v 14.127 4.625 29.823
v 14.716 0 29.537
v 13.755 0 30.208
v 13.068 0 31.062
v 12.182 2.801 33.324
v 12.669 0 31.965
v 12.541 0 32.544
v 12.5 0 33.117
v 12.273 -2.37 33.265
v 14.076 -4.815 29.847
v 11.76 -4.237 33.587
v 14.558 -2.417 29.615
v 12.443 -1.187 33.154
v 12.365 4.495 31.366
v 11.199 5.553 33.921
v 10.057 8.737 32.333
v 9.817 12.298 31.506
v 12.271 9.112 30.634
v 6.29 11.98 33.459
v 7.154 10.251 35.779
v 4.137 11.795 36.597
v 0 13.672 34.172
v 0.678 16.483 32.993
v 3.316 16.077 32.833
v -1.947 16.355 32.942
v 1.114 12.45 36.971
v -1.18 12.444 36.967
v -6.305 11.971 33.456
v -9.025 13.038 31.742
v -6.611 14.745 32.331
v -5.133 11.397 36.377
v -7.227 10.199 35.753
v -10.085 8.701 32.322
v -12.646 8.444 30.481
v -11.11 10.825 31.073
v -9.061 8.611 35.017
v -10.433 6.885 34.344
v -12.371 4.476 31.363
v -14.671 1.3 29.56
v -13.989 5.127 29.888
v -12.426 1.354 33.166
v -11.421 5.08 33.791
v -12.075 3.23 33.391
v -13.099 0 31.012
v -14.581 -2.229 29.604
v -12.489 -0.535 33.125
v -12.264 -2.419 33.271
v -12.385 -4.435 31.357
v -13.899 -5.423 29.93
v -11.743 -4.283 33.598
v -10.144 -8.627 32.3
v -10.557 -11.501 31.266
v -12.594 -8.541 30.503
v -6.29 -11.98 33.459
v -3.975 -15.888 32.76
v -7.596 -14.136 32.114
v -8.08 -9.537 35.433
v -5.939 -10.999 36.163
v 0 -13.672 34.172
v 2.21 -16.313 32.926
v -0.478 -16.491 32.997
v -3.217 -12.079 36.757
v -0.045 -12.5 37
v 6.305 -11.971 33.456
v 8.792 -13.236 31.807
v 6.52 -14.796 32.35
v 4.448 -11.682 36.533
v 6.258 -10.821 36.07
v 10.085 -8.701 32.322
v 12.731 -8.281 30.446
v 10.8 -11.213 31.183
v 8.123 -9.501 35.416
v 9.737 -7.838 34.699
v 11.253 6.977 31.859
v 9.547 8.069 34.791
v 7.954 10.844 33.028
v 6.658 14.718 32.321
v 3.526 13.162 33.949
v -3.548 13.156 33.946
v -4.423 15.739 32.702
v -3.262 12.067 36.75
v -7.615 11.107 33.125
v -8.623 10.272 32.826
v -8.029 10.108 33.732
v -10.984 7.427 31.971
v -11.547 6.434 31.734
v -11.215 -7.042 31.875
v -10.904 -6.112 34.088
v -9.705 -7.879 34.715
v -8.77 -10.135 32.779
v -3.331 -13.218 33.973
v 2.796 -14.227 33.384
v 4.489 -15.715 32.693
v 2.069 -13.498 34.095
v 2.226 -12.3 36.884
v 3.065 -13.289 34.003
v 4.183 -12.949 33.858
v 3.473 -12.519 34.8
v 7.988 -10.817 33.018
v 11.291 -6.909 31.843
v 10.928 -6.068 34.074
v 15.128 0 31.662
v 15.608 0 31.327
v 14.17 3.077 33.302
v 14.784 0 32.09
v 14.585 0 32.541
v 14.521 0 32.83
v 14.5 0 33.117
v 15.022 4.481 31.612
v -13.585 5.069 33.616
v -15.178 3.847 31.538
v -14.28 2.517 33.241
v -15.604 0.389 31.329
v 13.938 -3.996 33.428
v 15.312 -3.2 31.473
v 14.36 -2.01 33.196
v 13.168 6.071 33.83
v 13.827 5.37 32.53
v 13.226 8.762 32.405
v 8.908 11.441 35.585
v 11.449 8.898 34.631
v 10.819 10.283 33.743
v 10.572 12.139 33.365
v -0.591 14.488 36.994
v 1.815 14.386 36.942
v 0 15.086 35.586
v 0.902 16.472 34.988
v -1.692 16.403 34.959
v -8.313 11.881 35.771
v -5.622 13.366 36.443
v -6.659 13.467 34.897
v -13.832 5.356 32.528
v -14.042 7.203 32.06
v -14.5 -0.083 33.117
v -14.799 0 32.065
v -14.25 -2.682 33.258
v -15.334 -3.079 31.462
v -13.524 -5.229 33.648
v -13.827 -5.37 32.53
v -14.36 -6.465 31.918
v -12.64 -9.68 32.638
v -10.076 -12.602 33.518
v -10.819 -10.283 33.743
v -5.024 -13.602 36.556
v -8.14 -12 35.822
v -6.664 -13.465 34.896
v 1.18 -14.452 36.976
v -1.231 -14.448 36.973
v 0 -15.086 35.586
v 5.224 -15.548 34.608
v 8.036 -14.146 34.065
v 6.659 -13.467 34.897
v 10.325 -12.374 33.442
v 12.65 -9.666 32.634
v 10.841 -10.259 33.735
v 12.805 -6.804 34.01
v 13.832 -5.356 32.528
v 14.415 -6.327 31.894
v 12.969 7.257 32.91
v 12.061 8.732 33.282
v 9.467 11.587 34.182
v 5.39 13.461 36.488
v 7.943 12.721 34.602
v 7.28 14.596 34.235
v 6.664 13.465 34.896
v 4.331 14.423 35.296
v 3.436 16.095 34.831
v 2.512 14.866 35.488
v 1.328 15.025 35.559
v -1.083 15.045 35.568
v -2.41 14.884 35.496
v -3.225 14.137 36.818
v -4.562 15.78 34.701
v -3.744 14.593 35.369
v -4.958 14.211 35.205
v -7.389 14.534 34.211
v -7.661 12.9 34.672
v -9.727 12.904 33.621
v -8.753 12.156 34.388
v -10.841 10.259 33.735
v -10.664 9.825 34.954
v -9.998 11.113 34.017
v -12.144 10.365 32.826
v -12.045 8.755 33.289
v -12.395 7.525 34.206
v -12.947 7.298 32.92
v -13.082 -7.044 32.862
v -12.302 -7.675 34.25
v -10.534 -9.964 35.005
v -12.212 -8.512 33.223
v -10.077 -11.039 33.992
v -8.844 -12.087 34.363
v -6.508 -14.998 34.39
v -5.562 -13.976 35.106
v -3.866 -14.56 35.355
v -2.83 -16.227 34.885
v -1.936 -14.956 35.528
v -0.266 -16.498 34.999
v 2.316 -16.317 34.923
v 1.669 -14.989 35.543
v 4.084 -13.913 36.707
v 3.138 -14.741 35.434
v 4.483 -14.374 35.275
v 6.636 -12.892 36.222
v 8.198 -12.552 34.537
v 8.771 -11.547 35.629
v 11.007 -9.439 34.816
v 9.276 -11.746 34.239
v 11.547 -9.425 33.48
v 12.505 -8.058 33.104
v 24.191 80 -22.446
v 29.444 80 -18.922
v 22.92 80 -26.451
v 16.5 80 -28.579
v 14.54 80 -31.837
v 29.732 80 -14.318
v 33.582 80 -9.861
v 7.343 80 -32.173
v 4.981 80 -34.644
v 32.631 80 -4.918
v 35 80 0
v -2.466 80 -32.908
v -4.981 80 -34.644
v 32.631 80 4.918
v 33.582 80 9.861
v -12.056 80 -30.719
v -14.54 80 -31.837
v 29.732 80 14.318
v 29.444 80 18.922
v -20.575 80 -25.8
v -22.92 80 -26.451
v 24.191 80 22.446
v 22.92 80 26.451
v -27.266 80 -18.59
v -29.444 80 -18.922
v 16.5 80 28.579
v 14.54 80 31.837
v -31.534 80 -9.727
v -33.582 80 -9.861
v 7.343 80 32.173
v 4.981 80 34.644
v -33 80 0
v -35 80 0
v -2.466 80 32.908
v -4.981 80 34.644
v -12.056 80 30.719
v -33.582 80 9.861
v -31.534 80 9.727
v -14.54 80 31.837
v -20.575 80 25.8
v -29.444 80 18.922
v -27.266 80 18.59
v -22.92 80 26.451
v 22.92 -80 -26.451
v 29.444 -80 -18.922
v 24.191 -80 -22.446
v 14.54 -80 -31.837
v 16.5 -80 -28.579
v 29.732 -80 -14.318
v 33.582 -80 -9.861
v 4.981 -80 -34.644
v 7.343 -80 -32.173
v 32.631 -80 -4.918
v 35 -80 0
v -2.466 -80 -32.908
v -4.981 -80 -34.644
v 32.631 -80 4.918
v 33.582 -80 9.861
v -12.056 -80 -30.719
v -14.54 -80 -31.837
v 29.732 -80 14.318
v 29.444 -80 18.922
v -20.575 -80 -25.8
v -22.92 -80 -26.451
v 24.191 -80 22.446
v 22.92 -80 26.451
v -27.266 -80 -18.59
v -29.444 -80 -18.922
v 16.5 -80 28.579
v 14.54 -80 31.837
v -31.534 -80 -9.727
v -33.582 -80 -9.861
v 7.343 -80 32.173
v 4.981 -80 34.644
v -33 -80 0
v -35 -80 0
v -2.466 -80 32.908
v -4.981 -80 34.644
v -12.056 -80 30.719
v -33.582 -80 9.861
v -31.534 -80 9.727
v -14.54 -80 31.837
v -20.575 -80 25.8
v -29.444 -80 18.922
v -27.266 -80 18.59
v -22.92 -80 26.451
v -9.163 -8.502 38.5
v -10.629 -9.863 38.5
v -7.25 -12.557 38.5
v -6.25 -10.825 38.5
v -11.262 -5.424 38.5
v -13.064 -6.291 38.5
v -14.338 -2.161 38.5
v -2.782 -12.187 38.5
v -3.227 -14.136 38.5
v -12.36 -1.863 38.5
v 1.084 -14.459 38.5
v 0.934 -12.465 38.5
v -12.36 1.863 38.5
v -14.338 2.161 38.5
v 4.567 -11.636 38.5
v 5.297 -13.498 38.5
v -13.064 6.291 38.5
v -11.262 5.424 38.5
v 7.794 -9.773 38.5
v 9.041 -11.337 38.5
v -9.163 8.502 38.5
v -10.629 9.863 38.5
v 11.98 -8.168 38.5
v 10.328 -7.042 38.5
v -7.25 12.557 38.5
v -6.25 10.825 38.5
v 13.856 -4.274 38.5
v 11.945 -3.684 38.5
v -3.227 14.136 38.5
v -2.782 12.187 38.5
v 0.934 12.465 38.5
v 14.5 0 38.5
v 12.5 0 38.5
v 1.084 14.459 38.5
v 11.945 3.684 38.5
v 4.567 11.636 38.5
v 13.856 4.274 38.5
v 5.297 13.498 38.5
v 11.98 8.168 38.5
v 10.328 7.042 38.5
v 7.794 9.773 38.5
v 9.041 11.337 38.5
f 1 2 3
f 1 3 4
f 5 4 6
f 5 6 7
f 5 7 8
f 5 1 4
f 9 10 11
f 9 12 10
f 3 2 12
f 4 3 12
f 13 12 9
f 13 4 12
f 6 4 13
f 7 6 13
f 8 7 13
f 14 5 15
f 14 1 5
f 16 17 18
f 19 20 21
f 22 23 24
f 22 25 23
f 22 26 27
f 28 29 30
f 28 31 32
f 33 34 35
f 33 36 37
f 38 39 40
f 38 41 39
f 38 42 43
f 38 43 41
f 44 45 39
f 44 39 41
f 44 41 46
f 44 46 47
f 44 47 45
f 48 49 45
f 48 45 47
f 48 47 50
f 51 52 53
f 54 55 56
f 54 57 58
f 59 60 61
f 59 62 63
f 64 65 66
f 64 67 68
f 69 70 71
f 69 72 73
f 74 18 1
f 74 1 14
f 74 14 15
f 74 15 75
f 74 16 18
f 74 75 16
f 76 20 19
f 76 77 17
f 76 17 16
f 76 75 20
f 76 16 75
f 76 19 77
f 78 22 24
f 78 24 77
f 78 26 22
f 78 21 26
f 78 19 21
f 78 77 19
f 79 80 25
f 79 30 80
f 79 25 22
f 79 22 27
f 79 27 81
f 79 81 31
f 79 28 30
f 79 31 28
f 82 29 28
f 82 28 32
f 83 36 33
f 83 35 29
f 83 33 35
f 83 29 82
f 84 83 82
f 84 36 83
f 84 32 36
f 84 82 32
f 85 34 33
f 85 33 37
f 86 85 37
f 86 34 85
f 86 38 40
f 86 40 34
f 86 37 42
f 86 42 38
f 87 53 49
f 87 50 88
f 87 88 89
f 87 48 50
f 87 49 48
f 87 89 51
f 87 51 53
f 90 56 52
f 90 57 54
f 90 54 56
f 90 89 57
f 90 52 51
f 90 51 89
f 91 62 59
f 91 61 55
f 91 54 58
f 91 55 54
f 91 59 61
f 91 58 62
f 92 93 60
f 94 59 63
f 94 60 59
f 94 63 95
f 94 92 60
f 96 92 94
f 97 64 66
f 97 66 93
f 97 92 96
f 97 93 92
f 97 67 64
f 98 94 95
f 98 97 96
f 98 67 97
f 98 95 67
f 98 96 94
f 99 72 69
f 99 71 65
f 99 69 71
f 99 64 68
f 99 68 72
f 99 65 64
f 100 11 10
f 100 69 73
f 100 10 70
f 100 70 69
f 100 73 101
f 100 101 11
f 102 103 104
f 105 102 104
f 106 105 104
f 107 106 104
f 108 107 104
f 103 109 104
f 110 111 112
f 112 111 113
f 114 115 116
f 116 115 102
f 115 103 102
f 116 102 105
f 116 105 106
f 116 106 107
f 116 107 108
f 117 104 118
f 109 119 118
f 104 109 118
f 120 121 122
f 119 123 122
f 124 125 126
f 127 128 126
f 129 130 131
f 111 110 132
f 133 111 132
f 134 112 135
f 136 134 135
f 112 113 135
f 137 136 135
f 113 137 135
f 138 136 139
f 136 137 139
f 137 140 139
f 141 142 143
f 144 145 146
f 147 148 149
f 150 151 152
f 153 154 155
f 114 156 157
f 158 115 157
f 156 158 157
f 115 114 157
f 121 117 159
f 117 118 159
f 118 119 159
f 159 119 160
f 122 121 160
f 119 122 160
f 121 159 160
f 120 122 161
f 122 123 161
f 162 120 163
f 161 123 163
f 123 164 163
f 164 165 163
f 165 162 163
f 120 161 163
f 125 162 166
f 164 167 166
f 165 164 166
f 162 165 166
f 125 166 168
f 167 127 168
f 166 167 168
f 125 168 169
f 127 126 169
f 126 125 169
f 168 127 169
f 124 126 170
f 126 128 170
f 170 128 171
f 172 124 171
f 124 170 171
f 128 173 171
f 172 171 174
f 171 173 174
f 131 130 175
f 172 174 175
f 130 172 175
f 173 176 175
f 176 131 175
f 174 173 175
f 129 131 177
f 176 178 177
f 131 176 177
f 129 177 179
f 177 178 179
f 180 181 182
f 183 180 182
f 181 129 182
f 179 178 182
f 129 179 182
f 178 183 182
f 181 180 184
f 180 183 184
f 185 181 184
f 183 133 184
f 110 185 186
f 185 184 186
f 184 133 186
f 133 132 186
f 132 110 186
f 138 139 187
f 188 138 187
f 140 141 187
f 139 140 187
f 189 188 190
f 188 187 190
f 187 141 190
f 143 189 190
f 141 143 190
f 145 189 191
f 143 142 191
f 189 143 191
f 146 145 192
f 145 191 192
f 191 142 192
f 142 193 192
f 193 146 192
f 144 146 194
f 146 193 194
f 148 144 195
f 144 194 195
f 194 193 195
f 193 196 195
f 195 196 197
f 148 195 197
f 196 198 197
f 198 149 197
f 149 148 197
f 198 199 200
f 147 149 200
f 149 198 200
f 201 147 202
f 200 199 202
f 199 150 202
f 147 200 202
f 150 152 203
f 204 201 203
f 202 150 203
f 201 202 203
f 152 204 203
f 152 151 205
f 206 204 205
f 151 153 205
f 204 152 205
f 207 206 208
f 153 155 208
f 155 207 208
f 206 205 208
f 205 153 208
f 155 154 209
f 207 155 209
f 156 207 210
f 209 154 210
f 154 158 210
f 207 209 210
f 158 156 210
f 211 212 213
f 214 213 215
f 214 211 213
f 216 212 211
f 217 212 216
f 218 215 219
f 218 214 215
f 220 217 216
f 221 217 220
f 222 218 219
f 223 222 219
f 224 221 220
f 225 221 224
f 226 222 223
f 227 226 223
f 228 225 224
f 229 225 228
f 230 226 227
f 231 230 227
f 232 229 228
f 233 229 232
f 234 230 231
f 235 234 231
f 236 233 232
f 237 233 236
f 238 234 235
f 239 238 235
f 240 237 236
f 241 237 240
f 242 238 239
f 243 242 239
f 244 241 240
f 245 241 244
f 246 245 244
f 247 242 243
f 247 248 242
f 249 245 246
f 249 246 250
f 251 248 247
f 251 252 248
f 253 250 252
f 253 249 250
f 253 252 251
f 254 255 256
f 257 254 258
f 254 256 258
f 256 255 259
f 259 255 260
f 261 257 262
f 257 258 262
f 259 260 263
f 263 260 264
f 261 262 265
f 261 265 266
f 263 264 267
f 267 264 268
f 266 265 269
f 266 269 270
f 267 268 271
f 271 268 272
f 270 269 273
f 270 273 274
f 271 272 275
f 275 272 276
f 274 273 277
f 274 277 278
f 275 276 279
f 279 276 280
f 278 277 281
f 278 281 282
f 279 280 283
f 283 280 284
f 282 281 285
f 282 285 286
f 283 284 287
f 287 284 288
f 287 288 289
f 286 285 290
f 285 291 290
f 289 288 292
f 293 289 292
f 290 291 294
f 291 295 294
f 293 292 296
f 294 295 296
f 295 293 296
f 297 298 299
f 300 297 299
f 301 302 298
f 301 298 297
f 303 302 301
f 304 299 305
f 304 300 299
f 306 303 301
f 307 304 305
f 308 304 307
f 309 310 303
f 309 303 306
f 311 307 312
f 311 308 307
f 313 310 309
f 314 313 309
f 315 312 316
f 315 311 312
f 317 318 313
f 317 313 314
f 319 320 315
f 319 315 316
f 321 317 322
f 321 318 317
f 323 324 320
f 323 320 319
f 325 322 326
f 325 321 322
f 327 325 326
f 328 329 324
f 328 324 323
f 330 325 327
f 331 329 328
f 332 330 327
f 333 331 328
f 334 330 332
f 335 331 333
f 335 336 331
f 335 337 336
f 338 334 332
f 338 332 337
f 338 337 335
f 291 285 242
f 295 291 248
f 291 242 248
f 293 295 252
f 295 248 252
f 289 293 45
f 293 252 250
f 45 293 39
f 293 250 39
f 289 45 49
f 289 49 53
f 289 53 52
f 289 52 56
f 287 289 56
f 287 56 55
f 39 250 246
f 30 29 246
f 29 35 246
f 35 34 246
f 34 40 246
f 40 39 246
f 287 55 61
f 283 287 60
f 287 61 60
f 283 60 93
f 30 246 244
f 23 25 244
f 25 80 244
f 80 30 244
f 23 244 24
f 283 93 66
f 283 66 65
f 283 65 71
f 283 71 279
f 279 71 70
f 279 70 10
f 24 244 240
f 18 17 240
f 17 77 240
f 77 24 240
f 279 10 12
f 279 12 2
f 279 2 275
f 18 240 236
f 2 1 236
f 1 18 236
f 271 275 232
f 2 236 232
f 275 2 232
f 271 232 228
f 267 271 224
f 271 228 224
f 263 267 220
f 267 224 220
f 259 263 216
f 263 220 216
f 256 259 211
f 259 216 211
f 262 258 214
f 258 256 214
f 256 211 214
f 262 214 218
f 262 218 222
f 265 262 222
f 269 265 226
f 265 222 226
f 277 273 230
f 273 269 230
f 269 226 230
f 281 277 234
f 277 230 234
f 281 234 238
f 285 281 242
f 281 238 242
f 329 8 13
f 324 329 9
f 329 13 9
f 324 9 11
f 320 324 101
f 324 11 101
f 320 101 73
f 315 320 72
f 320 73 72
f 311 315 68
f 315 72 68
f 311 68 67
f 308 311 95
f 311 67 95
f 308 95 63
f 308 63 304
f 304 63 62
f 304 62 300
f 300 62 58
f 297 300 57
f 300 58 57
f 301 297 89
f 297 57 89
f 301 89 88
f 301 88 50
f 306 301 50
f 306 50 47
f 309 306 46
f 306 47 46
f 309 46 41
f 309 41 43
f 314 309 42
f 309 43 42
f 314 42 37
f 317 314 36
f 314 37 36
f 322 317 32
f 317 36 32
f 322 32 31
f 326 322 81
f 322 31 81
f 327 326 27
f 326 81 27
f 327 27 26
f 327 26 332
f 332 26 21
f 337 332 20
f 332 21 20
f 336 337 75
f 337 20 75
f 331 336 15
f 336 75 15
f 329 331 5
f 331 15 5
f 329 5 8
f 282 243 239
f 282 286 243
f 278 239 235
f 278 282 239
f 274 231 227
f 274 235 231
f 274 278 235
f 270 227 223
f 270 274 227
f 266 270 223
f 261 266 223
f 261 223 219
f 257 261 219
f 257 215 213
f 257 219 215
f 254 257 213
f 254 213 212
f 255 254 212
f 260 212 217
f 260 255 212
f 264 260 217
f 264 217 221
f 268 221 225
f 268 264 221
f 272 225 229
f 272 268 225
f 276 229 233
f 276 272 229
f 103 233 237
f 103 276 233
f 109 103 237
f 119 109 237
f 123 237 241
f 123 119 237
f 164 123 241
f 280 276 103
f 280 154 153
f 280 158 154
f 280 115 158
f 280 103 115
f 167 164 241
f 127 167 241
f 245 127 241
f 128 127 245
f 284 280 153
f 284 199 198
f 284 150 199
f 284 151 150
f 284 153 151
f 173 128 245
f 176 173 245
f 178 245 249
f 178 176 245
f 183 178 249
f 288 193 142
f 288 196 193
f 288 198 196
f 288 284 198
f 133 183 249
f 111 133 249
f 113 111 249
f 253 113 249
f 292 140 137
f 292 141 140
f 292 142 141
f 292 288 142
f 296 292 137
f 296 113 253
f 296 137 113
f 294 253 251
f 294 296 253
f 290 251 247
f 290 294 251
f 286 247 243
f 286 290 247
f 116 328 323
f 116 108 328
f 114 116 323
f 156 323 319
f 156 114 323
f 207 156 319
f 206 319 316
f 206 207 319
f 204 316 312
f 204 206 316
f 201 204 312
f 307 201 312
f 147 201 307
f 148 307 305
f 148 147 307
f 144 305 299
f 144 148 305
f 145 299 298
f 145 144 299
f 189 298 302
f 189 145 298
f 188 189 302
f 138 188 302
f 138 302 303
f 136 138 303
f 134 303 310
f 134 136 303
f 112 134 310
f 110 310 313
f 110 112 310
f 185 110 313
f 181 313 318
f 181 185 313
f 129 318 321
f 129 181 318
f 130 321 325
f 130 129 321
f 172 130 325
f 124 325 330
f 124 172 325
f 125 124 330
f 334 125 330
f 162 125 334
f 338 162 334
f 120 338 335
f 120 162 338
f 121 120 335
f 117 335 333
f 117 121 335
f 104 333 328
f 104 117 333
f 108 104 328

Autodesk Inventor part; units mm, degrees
ref_plane "YZ Plane" through (0, 0, 0) normal (1, 0, 0) x (0, 1, 0)
ref_plane "XZ Plane" through (0, 0, 0) normal (0, 1, 0) x (-1, 0, 0)
ref_plane "XY Plane" through (0, 0, 0) normal (0, 0, 1) x (1, 0, 0)
sketch "Szkic8" plane through (0, 0, 0) normal (0, 1, 0) x (-1, 0, 0)
  circle A0 centre (0, 0) radius 35
  circle A1 centre (0, 0) radius 33
  dimension "d53" = 70
  dimension "d54" = 2
extrude "Wyciągnięcie proste2" add sketch "Szkic8" along normal mid plane 160
sketch "Szkic13" plane through (0, 0, 0) normal (0, 0, 1) x (1, 0, 0)
  circle A0 centre (0, 0) radius 14.5
  circle A1 centre (0, 0) radius 12.5
  dimension "d67" = 29
  dimension "d68" = 2
extrude "Wyciągnięcie proste6" add sketch "Szkic13" along normal blind 38.5
sketch "Szkic14" plane through (0, 0, 38.5) normal (0, 0, 1) x (1, 0, 0)
  circle A0 centre (0, 0) radius 12.5 projected
extrude "Wyciągnięcie proste7" cut sketch "Szkic14" against normal blind 38.5
sketch "Szkic15" plane through (0, -80, 0) normal (0, -1, 0) x (1, 0, 0)
  circle A0 centre (0, 0) radius 33 projected
extrude "Wyciągnięcie proste8" cut sketch "Szkic15" against normal blind 160
fillet "Zaokrąglenie3" radius 2 2 edges at (0.0009, 14.5, 35) (-0.0009, -14.5, 35)
fillet "Zaokrąglenie4" radius 4 2 edges at (0.0036, -12.5, 33) (-0.005, 12.5, 33)
equation "\"d53\" = OD"
equation "\"d54\" = THK"
equation "\"d55\" = L1"
equation "\"d67\" = OD2"
equation "\"d68\" = THK"
equation "\"d69\" = L2"
equation "\"d71\" = L2"
equation "\"d73\" = L1"
equation "\"d75\" = THK"
equation "\"d76\" = 2 * THK"
equation "\"SzerokośćGięciaPodcięcia\" = Grubość"
equation "\"RozmiarPodcięciaNarożnika\" = 4 * Grubość"
equation "\"PromieńPrzejścia\" = PromieńGięcia"
equation "\"Rozmiar_promienia_Jacobiego\" = PromieńGięcia"
equation "\"Wielk_odstępu\" = Grubość"
equation "\"d2\" = PromieńGięcia"
equation "\"d23\" = PromieńGięcia"
equation "\"OD\" = 70"
equation "\"THK\" = 2"
equation "\"L1\" = 160"
equation "\"L2\" = 38.5"
equation "\"OD2\" = 29"
equation "\"Grubość\" = 1.5"
equation "\"PromieńGięcia\" = 3"
properties part number "Trójnik red. krótki  Ø70 29 70 s=2 L=160" material "304"
